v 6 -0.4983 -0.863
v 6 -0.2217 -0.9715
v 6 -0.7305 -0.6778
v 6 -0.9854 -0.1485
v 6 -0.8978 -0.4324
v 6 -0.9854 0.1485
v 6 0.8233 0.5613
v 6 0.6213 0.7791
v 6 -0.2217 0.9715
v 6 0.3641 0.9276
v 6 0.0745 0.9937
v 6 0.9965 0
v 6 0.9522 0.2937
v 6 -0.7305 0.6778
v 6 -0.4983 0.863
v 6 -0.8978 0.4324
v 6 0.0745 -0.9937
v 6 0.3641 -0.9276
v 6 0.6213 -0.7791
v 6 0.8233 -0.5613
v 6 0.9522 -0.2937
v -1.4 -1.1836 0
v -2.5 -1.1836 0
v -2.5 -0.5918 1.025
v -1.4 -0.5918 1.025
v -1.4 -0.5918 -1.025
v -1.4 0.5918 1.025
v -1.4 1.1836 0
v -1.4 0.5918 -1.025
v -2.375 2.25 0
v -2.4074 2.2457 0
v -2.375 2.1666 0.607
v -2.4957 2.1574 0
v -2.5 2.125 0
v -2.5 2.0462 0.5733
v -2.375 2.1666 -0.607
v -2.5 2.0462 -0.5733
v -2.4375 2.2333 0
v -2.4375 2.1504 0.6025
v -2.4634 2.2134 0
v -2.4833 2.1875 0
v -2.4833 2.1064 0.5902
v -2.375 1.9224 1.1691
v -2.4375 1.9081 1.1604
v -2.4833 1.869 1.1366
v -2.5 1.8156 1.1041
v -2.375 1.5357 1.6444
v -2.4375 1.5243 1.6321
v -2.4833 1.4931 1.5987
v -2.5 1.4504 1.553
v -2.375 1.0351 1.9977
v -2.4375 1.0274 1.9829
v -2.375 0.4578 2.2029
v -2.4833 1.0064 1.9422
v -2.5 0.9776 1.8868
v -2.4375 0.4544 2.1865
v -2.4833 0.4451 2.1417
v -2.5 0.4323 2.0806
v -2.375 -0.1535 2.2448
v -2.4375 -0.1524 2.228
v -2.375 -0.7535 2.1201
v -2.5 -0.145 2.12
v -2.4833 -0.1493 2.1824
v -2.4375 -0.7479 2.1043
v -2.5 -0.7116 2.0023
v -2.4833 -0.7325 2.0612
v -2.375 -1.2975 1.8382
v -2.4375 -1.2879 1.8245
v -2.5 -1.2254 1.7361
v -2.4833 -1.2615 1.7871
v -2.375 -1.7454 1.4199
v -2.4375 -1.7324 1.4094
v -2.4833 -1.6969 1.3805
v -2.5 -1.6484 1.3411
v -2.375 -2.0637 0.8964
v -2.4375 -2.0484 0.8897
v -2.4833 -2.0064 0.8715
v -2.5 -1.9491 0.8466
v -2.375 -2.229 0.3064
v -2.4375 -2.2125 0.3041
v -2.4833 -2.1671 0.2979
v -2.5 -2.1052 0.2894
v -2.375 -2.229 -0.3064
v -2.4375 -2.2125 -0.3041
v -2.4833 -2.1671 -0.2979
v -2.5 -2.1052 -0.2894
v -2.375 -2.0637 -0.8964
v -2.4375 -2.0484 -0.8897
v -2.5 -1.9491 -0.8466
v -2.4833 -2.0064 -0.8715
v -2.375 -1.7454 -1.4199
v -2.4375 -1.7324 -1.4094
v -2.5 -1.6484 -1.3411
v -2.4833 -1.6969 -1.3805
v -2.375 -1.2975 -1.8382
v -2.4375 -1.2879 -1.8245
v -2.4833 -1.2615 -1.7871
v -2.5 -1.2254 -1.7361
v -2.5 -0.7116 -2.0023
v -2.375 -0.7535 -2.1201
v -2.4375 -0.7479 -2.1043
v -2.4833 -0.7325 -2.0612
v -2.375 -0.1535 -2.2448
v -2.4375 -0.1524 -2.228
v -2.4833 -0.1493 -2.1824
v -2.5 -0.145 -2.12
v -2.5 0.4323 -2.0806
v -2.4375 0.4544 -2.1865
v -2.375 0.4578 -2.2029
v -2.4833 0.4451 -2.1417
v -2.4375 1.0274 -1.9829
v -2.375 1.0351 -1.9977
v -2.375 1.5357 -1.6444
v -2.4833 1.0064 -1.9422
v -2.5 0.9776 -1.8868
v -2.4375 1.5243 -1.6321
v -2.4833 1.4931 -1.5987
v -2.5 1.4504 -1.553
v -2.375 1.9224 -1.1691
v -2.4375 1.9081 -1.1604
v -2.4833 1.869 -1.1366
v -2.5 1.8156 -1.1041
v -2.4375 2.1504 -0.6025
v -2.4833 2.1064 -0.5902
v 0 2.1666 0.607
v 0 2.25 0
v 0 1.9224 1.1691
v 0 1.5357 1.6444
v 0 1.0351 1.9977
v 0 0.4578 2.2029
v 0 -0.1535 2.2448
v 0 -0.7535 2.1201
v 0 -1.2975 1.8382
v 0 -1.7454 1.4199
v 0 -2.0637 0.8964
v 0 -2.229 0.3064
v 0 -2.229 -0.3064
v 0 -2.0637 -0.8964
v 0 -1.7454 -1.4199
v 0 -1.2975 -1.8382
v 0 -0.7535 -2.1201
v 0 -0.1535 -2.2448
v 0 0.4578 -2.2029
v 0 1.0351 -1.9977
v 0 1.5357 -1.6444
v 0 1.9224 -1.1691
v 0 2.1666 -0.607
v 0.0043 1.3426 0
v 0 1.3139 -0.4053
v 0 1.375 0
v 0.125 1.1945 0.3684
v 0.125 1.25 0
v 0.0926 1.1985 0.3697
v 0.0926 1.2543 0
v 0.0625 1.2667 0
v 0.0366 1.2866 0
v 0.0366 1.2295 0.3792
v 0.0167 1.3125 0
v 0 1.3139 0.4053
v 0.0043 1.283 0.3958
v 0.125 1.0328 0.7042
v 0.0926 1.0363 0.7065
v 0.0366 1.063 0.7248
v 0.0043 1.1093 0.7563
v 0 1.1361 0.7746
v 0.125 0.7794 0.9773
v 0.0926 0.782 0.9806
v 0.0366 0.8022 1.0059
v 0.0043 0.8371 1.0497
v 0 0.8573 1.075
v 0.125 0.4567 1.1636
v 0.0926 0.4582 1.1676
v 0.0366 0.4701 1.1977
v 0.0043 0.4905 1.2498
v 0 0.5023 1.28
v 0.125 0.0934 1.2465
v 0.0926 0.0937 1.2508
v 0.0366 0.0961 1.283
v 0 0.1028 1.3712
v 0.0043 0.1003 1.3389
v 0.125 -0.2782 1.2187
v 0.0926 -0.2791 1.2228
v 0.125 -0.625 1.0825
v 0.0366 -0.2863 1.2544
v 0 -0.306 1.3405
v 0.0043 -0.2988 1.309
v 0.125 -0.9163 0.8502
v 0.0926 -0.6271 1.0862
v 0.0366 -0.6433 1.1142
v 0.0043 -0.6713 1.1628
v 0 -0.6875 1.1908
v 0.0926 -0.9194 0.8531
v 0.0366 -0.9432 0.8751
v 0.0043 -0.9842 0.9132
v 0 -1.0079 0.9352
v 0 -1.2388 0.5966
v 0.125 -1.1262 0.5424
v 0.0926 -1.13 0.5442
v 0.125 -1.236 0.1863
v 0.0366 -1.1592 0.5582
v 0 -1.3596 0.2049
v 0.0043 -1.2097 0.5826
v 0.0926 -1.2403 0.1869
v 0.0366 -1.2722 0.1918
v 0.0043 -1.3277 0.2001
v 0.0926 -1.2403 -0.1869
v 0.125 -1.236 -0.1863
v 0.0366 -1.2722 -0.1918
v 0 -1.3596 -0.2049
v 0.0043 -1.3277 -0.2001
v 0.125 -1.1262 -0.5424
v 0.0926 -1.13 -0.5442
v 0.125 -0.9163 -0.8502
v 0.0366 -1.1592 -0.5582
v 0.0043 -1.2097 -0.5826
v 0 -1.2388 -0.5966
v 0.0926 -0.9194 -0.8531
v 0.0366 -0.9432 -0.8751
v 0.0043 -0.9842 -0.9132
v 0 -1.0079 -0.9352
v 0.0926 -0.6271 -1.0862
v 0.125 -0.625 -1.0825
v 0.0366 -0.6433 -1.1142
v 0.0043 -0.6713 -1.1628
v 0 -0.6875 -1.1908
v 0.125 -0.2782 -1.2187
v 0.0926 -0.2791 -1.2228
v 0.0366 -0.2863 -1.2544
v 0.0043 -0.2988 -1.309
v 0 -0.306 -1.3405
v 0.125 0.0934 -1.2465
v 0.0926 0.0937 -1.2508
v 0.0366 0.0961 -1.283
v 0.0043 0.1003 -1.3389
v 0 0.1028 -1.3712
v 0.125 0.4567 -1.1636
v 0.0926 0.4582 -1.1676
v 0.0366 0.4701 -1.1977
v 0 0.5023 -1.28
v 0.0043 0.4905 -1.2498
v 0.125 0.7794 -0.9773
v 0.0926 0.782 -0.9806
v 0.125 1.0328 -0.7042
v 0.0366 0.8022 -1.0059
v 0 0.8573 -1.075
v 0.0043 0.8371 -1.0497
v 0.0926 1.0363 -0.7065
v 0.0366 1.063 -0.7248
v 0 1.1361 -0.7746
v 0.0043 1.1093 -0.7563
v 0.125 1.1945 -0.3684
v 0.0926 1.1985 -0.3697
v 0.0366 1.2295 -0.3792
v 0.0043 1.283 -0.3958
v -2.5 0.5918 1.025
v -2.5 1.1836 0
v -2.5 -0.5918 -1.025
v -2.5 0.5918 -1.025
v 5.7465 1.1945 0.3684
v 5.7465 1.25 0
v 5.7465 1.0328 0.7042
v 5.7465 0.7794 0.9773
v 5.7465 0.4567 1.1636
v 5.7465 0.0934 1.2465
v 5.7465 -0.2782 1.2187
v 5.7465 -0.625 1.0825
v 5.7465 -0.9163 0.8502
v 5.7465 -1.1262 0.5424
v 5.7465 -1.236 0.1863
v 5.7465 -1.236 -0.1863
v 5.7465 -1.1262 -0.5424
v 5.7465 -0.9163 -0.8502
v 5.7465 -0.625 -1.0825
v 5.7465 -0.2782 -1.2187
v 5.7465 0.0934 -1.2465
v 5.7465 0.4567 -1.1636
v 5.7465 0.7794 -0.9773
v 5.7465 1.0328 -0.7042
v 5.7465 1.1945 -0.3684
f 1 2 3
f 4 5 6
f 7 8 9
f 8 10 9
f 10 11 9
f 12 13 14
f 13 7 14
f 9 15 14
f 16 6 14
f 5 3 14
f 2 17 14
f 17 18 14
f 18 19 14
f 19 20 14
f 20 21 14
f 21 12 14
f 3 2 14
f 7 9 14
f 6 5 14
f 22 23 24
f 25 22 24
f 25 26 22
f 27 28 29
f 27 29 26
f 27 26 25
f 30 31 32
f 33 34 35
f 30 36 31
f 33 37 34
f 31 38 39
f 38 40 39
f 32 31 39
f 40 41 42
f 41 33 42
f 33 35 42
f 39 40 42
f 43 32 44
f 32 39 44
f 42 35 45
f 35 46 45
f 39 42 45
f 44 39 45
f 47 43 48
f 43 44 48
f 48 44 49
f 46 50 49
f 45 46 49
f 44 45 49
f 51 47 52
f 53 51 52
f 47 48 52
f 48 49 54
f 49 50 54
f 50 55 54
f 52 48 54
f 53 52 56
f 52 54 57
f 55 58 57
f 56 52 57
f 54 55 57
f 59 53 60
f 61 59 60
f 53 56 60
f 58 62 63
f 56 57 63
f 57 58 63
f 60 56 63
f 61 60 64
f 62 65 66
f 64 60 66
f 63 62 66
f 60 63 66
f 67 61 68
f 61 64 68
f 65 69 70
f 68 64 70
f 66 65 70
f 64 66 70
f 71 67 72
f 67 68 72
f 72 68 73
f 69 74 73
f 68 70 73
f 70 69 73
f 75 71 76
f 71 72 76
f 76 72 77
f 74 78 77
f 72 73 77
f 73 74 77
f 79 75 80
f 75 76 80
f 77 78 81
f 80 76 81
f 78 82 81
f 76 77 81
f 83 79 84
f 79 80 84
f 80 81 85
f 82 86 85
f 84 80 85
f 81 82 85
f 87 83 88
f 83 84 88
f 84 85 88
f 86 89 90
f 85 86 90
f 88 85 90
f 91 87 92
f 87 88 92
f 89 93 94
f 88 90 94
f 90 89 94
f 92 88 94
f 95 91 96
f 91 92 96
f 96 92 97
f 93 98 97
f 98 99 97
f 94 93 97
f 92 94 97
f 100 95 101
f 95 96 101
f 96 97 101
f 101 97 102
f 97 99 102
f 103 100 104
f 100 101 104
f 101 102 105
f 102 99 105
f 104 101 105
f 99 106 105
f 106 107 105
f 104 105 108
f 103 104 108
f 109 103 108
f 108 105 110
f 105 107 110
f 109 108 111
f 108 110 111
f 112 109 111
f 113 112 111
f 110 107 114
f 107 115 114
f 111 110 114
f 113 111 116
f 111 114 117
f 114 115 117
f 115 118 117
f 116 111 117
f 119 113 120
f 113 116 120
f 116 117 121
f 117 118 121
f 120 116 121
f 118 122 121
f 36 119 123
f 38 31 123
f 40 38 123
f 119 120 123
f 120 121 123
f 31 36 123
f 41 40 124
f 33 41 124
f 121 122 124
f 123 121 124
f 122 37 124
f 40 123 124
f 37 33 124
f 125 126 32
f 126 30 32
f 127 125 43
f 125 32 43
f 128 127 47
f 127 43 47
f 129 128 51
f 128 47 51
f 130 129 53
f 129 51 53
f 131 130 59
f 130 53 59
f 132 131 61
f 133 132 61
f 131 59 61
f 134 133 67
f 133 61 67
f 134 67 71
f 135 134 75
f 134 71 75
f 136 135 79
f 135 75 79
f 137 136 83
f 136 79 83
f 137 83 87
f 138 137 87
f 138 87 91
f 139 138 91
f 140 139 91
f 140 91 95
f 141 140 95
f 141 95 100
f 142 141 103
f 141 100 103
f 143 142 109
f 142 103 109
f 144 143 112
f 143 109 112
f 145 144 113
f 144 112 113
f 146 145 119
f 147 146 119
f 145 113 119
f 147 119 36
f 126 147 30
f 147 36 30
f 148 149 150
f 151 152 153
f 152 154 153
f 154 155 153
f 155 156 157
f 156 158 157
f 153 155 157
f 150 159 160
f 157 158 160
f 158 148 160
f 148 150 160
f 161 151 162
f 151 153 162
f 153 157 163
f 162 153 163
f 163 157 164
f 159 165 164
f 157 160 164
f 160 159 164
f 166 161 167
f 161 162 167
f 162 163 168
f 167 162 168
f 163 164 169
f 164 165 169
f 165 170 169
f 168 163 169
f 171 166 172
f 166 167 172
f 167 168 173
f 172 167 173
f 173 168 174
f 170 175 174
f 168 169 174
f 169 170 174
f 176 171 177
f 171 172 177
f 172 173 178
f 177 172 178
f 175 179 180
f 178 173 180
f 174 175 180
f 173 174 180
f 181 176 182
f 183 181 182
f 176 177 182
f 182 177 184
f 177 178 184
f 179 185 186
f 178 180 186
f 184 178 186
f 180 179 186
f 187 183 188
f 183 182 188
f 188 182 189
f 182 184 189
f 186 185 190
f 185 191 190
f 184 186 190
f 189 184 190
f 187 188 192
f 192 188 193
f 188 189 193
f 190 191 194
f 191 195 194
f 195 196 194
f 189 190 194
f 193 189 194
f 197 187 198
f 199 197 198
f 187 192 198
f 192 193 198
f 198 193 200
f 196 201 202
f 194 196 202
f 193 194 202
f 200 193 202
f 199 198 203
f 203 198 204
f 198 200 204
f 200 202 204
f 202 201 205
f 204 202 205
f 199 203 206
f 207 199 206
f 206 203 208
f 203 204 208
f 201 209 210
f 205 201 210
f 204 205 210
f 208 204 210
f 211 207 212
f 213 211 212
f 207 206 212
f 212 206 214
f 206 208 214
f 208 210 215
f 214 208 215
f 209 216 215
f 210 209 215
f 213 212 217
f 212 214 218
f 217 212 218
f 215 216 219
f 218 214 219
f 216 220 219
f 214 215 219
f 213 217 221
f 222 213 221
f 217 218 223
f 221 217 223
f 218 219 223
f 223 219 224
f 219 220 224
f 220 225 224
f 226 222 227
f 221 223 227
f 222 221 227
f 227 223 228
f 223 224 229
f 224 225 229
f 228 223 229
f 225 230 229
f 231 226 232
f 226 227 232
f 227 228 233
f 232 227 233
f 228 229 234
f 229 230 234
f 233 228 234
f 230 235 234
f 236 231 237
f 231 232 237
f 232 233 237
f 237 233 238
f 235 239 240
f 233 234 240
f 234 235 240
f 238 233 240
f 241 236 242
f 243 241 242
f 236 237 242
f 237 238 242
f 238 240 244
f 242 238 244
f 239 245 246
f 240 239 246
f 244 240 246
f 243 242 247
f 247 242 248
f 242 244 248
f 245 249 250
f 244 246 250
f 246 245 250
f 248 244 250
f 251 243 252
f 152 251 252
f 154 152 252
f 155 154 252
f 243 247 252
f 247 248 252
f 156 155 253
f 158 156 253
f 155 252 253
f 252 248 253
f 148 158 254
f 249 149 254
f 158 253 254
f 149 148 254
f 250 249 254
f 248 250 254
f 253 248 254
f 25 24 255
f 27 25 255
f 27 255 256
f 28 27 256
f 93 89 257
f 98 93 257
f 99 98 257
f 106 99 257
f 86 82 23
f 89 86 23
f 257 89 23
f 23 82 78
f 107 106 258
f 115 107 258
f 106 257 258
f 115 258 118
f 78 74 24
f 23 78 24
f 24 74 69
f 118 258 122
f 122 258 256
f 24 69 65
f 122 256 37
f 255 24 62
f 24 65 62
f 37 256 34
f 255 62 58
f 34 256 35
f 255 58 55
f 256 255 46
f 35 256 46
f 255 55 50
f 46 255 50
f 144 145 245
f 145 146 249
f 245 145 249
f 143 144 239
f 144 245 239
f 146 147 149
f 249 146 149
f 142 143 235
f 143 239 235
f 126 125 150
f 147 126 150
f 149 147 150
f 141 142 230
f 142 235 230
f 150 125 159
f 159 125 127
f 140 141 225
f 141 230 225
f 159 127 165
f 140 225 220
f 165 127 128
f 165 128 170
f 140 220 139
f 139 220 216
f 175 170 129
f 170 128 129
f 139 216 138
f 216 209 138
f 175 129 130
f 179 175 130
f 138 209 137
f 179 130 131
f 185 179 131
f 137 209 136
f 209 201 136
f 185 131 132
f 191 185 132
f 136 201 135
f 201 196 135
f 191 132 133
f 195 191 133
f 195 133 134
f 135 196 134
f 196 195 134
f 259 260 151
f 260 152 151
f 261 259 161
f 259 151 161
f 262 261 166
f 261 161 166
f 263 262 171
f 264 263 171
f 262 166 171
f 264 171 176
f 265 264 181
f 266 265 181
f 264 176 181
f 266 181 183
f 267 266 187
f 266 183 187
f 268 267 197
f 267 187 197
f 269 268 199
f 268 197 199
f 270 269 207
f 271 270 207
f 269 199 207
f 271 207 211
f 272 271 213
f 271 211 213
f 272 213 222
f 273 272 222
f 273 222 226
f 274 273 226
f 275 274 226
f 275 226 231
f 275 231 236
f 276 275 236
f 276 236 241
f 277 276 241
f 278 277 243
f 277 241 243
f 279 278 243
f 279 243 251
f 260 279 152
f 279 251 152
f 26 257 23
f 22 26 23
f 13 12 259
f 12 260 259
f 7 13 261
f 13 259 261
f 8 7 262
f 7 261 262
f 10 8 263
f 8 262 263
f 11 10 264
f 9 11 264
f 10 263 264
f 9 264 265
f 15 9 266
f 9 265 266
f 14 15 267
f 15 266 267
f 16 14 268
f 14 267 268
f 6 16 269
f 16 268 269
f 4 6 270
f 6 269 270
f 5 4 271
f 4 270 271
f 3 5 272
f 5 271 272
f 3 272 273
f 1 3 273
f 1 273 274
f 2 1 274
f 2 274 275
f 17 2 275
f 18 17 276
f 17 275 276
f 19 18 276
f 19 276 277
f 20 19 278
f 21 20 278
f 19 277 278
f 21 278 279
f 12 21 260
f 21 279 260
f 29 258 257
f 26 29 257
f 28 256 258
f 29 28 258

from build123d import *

# Parameters (mm, degrees)
CUT_EXTRUDE1_DEPTH = 1.1


with BuildPart() as part:
    # Sketch1 → Revolve1 (revolve)
    with BuildSketch(Plane.XY):
        with BuildLine():
            Line((5.7465, 1.25), (0.125, 1.25))
            ThreePointArc((0.125, 1.25), (0.036611652, 1.286611652), (0, 1.375))
            Line((0, 1.375), (0, 2.25))
            Line((0, 2.25), (-2.375, 2.25))
            ThreePointArc((-2.375, 2.25), (-2.463388348, 2.213388348), (-2.5, 2.125))
            Line((-2.5, 2.125), (-2.5, 0))
            Line((-2.5, 0), (6, 0))
            Line((6, 0), (6, 0.9965))
            Line((6, 0.9965), (5.7465, 1.25))
        make_face()
    revolve(axis=Axis((-2.5, 0, 0), (1, 0, 0)))

    # Sketch2 → Cut-Extrude1 (cut)
    with BuildSketch(Plane.ZY.offset(2.5)):
        Polygon((1.025, 0.591784026), (0, 1.183568052), (-1.025, 0.591784026), (-1.025, -0.591784026), (0, -1.183568052), (1.025, -0.591784026), align=None)
    extrude(amount=-CUT_EXTRUDE1_DEPTH, mode=Mode.SUBTRACT)


solid = part.part
